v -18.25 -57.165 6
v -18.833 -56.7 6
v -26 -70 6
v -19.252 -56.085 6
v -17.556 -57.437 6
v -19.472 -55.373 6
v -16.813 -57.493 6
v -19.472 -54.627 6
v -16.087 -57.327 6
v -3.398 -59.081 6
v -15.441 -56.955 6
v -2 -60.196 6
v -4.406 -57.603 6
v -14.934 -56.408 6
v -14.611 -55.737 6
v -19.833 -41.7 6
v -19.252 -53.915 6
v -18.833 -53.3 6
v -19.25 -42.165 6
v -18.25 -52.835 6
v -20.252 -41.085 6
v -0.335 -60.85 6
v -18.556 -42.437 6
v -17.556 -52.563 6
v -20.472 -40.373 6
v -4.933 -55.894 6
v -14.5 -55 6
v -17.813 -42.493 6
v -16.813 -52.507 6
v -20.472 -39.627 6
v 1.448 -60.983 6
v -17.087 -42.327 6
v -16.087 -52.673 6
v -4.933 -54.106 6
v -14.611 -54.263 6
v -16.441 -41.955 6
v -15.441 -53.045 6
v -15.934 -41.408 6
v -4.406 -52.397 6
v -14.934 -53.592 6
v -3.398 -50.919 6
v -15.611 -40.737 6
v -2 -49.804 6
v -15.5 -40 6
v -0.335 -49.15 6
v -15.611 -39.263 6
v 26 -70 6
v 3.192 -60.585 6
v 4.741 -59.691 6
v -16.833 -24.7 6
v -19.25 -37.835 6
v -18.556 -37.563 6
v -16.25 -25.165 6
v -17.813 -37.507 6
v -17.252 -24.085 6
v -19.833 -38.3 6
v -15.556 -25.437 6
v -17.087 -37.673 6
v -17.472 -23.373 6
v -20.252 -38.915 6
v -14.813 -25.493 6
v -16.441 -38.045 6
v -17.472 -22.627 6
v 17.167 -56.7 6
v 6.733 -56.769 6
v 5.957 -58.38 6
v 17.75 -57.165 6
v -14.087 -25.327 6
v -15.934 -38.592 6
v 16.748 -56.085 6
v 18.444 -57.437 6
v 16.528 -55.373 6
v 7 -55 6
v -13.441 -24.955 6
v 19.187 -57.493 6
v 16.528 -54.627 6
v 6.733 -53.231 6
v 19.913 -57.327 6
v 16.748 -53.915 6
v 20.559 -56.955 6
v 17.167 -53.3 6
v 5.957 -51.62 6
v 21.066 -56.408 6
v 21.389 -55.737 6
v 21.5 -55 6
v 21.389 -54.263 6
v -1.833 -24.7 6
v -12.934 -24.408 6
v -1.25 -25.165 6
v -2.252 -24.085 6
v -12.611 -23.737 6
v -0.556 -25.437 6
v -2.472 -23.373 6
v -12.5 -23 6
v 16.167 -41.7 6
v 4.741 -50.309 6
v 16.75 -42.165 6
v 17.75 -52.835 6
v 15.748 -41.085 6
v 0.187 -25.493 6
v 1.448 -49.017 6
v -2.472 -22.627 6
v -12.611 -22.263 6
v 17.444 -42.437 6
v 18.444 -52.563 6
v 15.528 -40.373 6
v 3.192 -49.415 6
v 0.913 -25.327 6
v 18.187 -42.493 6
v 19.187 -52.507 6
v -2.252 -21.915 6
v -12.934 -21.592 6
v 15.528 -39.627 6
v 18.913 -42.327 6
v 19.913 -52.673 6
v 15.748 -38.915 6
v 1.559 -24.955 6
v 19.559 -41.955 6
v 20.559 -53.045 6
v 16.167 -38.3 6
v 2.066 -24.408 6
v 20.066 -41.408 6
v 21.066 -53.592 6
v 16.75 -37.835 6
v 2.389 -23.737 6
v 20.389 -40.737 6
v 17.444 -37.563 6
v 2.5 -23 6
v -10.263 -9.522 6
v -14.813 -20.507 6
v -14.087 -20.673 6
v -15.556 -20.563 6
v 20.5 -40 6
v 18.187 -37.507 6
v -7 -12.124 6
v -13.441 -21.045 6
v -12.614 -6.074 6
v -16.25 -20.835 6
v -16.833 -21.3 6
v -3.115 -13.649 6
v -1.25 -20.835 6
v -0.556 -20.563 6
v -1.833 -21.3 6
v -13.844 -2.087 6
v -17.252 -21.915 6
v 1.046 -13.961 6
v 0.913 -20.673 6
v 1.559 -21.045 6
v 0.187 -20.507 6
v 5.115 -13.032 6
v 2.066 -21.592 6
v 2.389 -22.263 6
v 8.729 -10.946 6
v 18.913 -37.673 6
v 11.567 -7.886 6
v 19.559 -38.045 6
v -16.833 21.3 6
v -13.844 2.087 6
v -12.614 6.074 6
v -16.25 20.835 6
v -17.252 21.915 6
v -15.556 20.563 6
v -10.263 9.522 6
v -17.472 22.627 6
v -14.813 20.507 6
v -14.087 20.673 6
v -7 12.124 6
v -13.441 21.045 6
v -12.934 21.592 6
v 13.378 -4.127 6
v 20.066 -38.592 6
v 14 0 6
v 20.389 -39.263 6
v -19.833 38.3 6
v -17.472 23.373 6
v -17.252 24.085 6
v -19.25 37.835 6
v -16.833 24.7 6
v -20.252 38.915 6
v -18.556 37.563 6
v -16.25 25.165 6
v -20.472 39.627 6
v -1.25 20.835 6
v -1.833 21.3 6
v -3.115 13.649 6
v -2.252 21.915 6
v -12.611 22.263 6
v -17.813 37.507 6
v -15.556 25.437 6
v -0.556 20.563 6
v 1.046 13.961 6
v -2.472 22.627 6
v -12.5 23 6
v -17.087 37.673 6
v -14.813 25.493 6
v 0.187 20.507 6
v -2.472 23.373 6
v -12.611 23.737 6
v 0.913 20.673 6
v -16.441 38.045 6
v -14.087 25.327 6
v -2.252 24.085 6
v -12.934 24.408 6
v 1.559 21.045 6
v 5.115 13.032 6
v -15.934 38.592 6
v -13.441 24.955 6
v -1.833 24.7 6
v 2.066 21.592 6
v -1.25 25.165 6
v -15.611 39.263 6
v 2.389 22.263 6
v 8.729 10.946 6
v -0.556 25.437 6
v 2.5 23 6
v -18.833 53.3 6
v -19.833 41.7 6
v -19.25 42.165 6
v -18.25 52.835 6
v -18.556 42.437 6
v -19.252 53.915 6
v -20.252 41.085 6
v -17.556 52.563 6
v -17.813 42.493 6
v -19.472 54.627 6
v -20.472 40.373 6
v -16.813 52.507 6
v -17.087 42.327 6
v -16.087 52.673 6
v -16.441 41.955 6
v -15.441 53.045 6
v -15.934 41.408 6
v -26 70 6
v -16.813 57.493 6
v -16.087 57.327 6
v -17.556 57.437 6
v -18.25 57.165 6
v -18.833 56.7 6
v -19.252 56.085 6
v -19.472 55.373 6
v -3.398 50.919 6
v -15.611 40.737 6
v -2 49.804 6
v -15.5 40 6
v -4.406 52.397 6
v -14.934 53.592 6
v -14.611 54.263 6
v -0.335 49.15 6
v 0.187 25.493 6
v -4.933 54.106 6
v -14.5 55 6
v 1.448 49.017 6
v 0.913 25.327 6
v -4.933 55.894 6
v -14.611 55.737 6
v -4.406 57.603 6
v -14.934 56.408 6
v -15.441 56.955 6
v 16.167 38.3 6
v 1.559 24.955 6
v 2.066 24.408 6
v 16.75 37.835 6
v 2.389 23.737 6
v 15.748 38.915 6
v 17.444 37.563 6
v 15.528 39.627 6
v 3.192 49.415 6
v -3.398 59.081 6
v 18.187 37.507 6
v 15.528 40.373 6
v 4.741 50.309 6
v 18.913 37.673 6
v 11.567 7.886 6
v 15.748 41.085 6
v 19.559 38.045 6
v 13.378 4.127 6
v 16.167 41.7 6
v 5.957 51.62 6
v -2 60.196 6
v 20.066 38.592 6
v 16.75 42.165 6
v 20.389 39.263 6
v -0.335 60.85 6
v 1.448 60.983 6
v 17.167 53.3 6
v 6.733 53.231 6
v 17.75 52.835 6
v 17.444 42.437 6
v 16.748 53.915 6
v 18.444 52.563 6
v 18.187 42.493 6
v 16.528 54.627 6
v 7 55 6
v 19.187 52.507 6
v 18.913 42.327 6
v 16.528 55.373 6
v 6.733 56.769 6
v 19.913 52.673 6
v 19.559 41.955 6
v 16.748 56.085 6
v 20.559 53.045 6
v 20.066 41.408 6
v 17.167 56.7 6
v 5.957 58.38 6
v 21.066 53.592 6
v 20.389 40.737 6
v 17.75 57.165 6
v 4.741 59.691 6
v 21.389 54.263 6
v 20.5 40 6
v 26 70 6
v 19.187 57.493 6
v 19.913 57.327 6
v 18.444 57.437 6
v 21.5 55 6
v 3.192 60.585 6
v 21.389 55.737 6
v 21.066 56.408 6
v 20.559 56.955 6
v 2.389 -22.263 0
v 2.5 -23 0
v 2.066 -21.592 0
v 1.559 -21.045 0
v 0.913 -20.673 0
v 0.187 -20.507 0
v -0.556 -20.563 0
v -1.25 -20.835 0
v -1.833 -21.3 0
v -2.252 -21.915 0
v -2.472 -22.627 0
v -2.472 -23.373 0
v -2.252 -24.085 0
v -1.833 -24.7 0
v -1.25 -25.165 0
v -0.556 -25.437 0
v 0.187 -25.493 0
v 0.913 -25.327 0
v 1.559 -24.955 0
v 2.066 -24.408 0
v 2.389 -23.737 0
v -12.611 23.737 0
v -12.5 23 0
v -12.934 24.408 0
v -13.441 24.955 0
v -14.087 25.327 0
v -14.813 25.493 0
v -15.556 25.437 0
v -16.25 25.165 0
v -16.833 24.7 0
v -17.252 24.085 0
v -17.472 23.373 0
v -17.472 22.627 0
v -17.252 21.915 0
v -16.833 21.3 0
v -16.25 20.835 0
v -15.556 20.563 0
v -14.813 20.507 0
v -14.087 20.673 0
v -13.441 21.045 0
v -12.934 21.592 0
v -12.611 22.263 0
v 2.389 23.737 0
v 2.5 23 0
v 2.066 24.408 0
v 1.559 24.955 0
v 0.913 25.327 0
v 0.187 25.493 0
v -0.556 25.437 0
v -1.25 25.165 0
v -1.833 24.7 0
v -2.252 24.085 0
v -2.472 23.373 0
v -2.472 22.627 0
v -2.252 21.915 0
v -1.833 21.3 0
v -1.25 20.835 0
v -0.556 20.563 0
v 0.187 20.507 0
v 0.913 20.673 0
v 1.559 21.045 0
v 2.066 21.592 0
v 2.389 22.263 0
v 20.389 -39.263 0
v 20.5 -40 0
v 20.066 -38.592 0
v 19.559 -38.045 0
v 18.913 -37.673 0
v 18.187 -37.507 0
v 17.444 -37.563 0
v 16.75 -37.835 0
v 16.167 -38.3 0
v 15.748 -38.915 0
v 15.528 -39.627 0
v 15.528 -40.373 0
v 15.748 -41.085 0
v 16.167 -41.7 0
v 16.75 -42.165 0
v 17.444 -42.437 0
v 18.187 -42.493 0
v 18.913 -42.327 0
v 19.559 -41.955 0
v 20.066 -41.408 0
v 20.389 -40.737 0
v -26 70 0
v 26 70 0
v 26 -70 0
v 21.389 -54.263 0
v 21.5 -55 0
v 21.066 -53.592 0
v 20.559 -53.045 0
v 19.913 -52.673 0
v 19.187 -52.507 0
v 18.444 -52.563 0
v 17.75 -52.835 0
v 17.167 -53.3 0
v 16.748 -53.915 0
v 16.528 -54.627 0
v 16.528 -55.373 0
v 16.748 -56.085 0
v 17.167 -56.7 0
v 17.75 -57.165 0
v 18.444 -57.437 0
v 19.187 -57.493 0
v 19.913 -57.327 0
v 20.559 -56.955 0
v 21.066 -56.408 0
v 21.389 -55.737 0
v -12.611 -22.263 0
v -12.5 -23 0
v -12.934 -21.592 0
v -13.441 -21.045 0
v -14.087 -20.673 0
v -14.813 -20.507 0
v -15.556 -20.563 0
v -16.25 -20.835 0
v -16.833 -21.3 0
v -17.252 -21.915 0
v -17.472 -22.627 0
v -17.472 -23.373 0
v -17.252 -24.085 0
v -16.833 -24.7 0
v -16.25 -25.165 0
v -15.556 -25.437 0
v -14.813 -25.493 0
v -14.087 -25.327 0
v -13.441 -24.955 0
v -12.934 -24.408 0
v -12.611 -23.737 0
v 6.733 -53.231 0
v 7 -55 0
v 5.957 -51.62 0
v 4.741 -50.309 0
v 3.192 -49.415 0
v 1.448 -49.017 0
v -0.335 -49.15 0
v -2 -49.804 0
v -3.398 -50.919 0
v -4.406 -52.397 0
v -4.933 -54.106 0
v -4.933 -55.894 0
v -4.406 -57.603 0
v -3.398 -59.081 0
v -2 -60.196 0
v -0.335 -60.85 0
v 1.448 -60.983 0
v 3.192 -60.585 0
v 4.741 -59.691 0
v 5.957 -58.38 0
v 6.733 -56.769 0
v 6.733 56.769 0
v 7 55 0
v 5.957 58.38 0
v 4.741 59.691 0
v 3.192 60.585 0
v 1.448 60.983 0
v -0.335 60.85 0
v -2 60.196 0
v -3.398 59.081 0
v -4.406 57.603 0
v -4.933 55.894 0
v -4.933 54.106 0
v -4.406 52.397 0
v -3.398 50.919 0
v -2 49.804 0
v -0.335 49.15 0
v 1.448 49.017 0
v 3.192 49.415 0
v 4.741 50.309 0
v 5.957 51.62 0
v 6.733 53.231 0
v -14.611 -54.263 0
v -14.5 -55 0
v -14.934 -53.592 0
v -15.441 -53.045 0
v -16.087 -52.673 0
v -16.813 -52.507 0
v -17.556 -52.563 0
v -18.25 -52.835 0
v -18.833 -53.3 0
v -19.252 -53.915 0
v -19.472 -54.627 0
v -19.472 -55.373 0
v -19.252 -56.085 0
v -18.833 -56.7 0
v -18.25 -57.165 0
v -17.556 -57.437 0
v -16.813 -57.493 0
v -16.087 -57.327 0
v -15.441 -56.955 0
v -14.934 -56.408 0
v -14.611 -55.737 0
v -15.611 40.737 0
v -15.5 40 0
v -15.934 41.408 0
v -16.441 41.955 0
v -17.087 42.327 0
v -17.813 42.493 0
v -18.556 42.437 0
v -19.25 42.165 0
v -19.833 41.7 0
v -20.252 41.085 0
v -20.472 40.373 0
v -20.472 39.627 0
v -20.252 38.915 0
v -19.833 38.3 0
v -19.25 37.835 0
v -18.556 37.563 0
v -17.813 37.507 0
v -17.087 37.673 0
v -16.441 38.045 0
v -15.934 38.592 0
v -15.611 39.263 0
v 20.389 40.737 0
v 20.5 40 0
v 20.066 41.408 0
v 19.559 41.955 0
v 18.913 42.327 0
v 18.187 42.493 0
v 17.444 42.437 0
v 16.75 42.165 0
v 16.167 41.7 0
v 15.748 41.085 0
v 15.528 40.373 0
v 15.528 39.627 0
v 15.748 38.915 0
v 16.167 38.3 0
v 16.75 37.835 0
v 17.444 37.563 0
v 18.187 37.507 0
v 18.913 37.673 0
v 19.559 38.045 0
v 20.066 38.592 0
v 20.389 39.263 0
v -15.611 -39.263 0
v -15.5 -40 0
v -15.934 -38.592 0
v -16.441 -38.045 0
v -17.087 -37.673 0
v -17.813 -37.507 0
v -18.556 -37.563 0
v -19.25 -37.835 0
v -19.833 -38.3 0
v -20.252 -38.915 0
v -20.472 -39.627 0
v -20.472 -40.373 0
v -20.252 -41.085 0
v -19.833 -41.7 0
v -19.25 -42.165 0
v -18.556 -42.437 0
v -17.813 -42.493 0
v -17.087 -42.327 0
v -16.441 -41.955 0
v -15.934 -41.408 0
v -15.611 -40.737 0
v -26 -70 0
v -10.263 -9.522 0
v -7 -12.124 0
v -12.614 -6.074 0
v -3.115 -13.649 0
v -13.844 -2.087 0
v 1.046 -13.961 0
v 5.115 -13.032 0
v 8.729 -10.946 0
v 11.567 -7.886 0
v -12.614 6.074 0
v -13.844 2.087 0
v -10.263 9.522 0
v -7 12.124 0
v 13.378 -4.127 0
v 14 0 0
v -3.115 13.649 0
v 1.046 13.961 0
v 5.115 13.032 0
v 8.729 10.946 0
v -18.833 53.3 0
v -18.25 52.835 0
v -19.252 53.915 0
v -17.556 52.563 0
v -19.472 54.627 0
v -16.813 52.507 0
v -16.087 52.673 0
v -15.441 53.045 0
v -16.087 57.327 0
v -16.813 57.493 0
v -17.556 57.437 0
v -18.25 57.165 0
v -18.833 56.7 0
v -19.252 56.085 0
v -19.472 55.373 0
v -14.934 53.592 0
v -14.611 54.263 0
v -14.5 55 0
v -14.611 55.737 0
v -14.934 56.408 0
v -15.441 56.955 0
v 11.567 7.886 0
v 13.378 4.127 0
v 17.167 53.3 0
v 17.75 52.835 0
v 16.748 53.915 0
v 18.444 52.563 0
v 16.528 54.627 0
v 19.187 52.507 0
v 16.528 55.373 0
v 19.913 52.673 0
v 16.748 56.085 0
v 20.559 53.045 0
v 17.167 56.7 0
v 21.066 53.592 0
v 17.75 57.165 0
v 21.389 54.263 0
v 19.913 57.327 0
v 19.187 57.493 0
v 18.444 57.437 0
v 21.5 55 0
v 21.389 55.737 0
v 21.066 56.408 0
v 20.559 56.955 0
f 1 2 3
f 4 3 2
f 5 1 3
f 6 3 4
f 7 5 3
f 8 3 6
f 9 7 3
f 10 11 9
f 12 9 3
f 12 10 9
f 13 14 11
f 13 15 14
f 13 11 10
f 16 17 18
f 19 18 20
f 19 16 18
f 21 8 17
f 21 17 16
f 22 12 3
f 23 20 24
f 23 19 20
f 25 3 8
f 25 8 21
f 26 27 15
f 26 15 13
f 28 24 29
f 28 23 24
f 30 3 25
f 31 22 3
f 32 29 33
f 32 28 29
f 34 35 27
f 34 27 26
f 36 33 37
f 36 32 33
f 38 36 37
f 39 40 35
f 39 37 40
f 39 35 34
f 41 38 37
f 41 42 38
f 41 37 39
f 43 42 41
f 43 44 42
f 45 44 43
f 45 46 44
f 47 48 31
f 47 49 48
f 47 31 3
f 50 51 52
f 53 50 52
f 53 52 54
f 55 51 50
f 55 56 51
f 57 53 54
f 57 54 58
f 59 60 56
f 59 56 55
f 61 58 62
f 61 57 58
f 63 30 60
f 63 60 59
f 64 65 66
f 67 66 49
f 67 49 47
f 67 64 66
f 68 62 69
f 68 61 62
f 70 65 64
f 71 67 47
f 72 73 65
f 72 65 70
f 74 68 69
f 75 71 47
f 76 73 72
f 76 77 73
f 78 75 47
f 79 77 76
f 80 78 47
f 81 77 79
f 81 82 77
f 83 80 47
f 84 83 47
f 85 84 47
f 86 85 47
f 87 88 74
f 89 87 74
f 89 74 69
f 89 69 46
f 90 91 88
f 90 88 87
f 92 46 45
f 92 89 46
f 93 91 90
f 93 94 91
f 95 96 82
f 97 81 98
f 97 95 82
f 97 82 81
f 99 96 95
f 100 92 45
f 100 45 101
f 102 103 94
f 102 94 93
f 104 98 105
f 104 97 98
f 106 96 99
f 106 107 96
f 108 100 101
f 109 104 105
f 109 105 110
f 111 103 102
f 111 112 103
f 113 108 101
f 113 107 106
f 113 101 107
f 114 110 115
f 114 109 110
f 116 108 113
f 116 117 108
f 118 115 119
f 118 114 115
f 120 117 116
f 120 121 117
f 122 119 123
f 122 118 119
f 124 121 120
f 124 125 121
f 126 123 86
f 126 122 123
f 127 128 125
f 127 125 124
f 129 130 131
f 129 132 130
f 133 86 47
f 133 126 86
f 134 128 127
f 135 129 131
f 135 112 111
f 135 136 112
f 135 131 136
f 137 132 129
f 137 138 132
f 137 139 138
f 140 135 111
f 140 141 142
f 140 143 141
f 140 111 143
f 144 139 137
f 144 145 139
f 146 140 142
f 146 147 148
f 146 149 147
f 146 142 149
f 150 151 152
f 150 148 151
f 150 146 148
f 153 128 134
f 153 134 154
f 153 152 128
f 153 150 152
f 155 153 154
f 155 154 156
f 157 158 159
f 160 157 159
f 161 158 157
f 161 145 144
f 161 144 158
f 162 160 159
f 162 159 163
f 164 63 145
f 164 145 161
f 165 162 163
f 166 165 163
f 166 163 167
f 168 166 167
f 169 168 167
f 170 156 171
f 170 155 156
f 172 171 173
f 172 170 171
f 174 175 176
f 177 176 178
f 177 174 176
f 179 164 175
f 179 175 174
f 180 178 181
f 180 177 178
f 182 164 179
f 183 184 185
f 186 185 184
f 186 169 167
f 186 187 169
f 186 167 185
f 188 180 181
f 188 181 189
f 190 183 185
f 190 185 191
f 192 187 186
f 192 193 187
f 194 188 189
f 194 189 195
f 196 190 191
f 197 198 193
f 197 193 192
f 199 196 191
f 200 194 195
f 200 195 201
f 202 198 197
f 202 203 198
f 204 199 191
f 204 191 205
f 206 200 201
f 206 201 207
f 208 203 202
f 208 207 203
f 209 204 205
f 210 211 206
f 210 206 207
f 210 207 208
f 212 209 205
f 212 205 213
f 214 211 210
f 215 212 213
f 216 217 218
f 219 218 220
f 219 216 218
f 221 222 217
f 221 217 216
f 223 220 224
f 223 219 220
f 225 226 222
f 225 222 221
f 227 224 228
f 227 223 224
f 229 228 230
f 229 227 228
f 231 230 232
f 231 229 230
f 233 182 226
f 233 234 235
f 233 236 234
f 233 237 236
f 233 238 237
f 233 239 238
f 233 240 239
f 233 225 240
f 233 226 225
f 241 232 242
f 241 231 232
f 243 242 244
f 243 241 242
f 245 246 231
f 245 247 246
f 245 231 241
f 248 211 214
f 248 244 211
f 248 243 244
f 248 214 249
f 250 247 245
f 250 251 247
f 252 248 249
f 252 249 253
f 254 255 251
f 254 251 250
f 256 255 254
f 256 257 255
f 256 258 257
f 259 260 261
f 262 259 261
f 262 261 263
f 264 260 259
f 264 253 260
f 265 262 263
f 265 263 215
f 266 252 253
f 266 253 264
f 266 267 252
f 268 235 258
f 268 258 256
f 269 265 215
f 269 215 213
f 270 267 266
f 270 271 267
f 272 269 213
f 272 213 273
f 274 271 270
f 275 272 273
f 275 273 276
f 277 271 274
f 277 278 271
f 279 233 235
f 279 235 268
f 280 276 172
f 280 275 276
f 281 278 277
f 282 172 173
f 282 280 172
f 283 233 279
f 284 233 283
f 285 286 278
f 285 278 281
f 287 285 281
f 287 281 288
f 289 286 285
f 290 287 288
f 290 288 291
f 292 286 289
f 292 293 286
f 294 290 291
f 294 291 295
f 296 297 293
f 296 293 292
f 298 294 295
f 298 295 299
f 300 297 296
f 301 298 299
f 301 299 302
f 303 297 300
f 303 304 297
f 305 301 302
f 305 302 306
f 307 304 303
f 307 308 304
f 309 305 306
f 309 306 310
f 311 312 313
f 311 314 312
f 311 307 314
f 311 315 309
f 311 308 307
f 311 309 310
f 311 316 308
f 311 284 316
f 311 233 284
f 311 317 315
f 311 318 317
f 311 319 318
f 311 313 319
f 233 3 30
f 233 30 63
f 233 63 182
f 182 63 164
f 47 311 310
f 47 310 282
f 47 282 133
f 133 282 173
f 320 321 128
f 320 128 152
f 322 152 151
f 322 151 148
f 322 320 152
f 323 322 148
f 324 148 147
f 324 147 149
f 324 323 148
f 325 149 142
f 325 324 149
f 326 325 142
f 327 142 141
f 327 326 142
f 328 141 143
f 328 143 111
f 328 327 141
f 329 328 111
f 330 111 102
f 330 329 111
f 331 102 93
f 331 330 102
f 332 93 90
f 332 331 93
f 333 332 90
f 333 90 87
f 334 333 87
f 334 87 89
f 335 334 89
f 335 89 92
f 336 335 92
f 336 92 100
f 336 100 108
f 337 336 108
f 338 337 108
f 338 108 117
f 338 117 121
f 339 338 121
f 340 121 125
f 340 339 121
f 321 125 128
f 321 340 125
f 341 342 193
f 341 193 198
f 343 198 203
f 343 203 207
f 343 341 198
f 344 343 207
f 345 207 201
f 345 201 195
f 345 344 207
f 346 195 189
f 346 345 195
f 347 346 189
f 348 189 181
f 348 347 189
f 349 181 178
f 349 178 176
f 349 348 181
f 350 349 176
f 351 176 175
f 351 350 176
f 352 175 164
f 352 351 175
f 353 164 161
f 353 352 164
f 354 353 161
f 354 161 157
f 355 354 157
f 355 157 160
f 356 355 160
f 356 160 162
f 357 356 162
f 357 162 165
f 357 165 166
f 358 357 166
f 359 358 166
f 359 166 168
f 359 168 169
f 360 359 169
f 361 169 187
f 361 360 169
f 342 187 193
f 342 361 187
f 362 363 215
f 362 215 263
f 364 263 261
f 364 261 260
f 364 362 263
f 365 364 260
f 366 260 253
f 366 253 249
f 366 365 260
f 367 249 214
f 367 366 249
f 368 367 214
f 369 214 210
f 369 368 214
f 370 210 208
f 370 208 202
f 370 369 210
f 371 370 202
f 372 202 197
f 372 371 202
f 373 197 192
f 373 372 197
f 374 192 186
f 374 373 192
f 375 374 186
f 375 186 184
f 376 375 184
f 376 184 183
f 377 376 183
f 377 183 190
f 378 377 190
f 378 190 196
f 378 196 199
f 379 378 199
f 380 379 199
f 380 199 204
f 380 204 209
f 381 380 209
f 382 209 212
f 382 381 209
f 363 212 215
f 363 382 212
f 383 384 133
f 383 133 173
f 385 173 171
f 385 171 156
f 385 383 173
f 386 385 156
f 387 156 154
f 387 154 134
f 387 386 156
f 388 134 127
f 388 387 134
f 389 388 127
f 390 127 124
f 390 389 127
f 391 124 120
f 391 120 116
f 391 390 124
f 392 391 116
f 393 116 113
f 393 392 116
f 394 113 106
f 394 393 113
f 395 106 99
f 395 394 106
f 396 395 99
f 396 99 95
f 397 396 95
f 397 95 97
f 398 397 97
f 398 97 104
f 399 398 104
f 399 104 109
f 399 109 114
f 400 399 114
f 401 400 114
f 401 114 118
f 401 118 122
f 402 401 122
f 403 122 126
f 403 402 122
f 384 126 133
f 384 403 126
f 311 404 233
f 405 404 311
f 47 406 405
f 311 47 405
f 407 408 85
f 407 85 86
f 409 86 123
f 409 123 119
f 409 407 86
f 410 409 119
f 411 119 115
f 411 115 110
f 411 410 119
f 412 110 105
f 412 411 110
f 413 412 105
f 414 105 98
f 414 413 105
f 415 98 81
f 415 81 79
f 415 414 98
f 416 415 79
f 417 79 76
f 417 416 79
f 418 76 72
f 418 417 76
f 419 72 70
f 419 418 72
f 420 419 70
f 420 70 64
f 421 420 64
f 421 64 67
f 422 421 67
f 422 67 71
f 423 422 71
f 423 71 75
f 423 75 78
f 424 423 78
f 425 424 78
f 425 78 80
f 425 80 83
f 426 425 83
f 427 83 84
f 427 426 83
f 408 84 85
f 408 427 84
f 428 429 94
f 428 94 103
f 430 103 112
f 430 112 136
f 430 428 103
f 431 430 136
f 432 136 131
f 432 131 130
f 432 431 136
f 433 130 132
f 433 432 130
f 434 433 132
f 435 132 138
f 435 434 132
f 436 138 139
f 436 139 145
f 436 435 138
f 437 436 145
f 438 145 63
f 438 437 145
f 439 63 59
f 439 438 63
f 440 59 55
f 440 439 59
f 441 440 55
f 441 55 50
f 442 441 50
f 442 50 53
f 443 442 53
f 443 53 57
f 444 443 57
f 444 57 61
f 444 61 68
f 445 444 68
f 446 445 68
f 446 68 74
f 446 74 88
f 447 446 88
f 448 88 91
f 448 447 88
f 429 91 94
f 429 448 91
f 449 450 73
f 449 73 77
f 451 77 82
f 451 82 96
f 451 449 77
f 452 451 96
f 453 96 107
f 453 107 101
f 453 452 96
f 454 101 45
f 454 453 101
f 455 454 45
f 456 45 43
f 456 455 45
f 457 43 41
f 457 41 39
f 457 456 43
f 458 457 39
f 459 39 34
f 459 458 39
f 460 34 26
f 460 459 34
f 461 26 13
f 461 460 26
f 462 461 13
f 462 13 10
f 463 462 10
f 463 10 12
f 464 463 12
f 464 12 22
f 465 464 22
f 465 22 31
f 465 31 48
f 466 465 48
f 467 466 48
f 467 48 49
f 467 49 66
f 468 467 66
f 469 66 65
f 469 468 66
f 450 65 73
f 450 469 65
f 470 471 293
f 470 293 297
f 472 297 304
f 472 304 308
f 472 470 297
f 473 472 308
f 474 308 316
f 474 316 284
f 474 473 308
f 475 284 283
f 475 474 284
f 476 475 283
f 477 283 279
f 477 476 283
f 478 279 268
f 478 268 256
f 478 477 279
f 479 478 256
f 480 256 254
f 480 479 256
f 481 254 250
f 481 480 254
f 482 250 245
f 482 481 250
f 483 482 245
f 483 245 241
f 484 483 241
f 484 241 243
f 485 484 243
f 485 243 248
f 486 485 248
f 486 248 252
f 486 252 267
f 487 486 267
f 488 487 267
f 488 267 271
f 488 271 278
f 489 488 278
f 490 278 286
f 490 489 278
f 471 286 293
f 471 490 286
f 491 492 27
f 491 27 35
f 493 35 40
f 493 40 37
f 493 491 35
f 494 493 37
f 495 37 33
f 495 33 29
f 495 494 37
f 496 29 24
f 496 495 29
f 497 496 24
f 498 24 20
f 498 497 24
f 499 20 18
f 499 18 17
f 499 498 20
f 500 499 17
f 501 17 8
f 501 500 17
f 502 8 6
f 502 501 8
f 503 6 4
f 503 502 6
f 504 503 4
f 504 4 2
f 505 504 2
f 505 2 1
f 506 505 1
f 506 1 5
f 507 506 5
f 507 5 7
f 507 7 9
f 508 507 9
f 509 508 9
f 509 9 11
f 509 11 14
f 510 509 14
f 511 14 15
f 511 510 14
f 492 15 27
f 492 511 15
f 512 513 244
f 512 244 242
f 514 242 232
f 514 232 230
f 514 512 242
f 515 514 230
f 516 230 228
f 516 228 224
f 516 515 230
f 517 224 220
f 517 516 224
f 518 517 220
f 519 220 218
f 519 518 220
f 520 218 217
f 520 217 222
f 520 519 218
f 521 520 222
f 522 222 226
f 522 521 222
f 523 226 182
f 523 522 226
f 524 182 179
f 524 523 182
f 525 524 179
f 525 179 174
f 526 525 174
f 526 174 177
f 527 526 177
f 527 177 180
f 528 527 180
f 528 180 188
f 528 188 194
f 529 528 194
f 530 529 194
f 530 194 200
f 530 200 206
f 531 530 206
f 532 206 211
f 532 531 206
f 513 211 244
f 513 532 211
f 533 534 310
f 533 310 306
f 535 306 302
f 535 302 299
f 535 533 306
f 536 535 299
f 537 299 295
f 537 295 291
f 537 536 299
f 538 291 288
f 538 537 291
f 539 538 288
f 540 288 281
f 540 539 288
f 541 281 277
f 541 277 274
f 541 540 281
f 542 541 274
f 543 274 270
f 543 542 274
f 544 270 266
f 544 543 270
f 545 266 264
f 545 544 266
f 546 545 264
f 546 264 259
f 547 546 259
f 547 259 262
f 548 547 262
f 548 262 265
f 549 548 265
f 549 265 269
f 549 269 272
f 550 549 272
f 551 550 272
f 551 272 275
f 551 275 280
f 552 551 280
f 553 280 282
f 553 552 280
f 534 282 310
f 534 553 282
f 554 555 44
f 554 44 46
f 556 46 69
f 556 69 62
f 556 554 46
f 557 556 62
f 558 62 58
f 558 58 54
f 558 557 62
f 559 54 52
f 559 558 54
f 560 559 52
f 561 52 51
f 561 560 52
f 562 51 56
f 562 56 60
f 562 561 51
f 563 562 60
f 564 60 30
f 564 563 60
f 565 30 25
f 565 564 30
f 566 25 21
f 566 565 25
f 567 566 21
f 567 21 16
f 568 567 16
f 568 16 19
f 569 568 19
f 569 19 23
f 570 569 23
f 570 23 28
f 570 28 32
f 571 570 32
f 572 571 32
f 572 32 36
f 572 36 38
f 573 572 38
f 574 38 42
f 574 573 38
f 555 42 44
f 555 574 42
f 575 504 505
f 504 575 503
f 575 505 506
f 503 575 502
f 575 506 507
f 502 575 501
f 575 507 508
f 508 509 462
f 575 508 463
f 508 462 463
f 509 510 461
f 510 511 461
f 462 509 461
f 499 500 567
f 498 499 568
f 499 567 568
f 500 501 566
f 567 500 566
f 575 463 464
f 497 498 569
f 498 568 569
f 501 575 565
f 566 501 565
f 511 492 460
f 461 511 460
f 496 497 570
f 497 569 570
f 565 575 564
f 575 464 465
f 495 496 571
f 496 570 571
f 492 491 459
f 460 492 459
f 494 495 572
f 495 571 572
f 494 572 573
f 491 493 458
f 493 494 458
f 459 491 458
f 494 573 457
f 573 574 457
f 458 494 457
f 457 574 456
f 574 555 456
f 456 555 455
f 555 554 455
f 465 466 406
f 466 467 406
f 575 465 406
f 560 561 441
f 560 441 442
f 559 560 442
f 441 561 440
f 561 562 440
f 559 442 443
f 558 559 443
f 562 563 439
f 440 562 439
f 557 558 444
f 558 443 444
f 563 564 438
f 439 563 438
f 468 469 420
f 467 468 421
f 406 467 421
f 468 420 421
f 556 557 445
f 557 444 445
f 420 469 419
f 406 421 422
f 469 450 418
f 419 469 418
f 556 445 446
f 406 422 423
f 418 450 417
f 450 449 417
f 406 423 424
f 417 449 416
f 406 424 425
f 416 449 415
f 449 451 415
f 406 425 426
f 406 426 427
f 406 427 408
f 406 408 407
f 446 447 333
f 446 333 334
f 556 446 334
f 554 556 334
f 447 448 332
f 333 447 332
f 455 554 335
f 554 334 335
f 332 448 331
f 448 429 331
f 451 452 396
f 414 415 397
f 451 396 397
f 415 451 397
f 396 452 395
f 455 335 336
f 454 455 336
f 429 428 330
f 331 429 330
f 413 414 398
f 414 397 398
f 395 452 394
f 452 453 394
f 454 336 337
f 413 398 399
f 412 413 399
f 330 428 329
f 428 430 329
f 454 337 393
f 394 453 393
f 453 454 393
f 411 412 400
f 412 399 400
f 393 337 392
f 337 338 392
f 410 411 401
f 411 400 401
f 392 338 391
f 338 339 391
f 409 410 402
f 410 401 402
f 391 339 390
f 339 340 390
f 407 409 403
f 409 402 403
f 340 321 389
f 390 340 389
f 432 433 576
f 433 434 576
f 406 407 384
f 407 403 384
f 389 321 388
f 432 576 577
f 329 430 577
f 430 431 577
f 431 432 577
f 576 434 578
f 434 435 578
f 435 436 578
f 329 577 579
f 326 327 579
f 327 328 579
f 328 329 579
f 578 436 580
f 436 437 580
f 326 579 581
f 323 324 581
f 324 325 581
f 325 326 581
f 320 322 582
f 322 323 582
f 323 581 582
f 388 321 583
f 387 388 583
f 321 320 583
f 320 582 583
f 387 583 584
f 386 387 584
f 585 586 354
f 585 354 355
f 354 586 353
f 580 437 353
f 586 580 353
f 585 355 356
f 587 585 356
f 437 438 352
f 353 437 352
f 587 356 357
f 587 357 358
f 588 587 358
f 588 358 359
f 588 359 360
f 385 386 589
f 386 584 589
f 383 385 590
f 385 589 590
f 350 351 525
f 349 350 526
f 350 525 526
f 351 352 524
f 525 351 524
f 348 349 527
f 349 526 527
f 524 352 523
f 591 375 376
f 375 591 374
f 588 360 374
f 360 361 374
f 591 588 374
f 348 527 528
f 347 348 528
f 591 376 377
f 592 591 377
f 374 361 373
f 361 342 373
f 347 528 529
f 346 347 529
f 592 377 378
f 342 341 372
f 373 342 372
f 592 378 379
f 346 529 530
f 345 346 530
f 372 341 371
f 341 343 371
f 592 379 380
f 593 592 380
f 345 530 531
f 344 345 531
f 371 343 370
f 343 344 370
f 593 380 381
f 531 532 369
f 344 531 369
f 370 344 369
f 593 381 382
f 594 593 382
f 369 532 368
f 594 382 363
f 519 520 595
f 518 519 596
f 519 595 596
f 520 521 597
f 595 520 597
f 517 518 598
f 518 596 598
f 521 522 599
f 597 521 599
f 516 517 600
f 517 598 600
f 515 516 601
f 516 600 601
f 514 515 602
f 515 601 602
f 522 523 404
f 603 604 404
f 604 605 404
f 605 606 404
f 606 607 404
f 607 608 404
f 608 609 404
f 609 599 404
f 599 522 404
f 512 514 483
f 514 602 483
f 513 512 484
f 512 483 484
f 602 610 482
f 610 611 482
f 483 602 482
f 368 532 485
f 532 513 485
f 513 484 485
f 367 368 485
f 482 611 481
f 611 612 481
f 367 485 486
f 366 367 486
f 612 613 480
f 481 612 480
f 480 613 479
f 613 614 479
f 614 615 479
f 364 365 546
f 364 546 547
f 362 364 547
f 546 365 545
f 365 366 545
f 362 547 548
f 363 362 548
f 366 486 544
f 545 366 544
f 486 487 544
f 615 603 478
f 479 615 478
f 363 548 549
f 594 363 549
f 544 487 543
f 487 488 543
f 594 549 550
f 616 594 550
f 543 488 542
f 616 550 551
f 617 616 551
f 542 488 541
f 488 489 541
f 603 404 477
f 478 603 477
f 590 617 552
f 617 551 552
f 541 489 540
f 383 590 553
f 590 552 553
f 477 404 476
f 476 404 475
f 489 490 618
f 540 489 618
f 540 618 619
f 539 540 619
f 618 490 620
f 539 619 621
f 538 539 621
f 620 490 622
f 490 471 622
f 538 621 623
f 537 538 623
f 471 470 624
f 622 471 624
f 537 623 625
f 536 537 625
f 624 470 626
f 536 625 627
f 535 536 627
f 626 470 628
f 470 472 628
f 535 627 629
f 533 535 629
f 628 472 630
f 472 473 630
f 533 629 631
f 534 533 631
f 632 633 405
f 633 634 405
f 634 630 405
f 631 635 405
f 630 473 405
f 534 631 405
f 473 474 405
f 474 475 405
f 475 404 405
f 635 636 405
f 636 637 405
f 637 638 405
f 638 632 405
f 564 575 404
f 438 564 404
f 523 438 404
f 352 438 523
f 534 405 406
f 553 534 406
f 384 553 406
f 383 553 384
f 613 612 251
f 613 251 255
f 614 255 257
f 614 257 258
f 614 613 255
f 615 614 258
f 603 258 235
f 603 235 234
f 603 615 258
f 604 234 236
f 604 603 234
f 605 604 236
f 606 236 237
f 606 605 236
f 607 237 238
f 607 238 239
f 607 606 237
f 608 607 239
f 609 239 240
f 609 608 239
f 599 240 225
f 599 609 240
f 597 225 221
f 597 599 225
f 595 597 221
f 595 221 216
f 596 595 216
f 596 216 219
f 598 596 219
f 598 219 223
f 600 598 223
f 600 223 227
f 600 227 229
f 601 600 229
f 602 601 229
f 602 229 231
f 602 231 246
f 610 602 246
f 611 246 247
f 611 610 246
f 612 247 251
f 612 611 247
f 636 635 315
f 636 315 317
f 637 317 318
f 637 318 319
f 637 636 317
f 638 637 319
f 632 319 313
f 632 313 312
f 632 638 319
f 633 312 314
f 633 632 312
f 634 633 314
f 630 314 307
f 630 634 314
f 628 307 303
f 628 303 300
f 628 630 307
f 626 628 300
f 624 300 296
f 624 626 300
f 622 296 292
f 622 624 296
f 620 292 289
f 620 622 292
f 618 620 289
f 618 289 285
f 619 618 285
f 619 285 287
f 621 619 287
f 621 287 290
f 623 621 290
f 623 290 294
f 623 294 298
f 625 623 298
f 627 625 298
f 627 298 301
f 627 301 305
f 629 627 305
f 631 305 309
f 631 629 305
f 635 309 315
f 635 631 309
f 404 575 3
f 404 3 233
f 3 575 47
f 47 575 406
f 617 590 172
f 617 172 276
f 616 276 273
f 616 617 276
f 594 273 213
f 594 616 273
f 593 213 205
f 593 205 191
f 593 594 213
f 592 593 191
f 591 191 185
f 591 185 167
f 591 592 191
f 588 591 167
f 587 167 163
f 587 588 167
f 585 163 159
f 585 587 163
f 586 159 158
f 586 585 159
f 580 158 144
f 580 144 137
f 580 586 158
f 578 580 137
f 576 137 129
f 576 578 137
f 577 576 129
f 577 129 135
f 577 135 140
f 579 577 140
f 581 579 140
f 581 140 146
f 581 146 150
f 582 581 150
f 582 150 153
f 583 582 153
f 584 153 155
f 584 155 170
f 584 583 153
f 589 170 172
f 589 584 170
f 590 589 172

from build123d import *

# Parameters (mm, degrees)
SKETCH_W   = 52
SKETCH_H   = 140
SKETCH_R   = 14
SKETCH_R_2 = 2.5
SKETCH_R_3 = 6
PAD_DEPTH  = 6


with BuildPart() as part:
    # Sketch → Pad (new body)
    with BuildSketch(Plane.XY):
        Rectangle(SKETCH_W, SKETCH_H)
        Circle(SKETCH_R, mode=Mode.SUBTRACT)
        with Locations((-15, 23)):
            Circle(SKETCH_R_2, mode=Mode.SUBTRACT)
        with Locations((0, 23)):
            Circle(SKETCH_R_2, mode=Mode.SUBTRACT)
        with Locations((-15, -23)):
            Circle(SKETCH_R_2, mode=Mode.SUBTRACT)
        with Locations((0, -23)):
            Circle(SKETCH_R_2, mode=Mode.SUBTRACT)
        with Locations((-18, 40)):
            Circle(SKETCH_R_2, mode=Mode.SUBTRACT)
        with Locations((18, 40)):
            Circle(SKETCH_R_2, mode=Mode.SUBTRACT)
        with Locations((18, -40)):
            Circle(SKETCH_R_2, mode=Mode.SUBTRACT)
        with Locations((-18, -40)):
            Circle(SKETCH_R_2, mode=Mode.SUBTRACT)
        with Locations((1, 55)):
            Circle(SKETCH_R_3, mode=Mode.SUBTRACT)
        with Locations((1, -55)):
            Circle(SKETCH_R_3, mode=Mode.SUBTRACT)
        with Locations((-17, 55)):
            Circle(SKETCH_R_2, mode=Mode.SUBTRACT)
        with Locations((19, 55)):
            Circle(SKETCH_R_2, mode=Mode.SUBTRACT)
        with Locations((-17, -55)):
            Circle(SKETCH_R_2, mode=Mode.SUBTRACT)
        with Locations((19, -55)):
            Circle(SKETCH_R_2, mode=Mode.SUBTRACT)
    extrude(amount=PAD_DEPTH)


solid = part.part
